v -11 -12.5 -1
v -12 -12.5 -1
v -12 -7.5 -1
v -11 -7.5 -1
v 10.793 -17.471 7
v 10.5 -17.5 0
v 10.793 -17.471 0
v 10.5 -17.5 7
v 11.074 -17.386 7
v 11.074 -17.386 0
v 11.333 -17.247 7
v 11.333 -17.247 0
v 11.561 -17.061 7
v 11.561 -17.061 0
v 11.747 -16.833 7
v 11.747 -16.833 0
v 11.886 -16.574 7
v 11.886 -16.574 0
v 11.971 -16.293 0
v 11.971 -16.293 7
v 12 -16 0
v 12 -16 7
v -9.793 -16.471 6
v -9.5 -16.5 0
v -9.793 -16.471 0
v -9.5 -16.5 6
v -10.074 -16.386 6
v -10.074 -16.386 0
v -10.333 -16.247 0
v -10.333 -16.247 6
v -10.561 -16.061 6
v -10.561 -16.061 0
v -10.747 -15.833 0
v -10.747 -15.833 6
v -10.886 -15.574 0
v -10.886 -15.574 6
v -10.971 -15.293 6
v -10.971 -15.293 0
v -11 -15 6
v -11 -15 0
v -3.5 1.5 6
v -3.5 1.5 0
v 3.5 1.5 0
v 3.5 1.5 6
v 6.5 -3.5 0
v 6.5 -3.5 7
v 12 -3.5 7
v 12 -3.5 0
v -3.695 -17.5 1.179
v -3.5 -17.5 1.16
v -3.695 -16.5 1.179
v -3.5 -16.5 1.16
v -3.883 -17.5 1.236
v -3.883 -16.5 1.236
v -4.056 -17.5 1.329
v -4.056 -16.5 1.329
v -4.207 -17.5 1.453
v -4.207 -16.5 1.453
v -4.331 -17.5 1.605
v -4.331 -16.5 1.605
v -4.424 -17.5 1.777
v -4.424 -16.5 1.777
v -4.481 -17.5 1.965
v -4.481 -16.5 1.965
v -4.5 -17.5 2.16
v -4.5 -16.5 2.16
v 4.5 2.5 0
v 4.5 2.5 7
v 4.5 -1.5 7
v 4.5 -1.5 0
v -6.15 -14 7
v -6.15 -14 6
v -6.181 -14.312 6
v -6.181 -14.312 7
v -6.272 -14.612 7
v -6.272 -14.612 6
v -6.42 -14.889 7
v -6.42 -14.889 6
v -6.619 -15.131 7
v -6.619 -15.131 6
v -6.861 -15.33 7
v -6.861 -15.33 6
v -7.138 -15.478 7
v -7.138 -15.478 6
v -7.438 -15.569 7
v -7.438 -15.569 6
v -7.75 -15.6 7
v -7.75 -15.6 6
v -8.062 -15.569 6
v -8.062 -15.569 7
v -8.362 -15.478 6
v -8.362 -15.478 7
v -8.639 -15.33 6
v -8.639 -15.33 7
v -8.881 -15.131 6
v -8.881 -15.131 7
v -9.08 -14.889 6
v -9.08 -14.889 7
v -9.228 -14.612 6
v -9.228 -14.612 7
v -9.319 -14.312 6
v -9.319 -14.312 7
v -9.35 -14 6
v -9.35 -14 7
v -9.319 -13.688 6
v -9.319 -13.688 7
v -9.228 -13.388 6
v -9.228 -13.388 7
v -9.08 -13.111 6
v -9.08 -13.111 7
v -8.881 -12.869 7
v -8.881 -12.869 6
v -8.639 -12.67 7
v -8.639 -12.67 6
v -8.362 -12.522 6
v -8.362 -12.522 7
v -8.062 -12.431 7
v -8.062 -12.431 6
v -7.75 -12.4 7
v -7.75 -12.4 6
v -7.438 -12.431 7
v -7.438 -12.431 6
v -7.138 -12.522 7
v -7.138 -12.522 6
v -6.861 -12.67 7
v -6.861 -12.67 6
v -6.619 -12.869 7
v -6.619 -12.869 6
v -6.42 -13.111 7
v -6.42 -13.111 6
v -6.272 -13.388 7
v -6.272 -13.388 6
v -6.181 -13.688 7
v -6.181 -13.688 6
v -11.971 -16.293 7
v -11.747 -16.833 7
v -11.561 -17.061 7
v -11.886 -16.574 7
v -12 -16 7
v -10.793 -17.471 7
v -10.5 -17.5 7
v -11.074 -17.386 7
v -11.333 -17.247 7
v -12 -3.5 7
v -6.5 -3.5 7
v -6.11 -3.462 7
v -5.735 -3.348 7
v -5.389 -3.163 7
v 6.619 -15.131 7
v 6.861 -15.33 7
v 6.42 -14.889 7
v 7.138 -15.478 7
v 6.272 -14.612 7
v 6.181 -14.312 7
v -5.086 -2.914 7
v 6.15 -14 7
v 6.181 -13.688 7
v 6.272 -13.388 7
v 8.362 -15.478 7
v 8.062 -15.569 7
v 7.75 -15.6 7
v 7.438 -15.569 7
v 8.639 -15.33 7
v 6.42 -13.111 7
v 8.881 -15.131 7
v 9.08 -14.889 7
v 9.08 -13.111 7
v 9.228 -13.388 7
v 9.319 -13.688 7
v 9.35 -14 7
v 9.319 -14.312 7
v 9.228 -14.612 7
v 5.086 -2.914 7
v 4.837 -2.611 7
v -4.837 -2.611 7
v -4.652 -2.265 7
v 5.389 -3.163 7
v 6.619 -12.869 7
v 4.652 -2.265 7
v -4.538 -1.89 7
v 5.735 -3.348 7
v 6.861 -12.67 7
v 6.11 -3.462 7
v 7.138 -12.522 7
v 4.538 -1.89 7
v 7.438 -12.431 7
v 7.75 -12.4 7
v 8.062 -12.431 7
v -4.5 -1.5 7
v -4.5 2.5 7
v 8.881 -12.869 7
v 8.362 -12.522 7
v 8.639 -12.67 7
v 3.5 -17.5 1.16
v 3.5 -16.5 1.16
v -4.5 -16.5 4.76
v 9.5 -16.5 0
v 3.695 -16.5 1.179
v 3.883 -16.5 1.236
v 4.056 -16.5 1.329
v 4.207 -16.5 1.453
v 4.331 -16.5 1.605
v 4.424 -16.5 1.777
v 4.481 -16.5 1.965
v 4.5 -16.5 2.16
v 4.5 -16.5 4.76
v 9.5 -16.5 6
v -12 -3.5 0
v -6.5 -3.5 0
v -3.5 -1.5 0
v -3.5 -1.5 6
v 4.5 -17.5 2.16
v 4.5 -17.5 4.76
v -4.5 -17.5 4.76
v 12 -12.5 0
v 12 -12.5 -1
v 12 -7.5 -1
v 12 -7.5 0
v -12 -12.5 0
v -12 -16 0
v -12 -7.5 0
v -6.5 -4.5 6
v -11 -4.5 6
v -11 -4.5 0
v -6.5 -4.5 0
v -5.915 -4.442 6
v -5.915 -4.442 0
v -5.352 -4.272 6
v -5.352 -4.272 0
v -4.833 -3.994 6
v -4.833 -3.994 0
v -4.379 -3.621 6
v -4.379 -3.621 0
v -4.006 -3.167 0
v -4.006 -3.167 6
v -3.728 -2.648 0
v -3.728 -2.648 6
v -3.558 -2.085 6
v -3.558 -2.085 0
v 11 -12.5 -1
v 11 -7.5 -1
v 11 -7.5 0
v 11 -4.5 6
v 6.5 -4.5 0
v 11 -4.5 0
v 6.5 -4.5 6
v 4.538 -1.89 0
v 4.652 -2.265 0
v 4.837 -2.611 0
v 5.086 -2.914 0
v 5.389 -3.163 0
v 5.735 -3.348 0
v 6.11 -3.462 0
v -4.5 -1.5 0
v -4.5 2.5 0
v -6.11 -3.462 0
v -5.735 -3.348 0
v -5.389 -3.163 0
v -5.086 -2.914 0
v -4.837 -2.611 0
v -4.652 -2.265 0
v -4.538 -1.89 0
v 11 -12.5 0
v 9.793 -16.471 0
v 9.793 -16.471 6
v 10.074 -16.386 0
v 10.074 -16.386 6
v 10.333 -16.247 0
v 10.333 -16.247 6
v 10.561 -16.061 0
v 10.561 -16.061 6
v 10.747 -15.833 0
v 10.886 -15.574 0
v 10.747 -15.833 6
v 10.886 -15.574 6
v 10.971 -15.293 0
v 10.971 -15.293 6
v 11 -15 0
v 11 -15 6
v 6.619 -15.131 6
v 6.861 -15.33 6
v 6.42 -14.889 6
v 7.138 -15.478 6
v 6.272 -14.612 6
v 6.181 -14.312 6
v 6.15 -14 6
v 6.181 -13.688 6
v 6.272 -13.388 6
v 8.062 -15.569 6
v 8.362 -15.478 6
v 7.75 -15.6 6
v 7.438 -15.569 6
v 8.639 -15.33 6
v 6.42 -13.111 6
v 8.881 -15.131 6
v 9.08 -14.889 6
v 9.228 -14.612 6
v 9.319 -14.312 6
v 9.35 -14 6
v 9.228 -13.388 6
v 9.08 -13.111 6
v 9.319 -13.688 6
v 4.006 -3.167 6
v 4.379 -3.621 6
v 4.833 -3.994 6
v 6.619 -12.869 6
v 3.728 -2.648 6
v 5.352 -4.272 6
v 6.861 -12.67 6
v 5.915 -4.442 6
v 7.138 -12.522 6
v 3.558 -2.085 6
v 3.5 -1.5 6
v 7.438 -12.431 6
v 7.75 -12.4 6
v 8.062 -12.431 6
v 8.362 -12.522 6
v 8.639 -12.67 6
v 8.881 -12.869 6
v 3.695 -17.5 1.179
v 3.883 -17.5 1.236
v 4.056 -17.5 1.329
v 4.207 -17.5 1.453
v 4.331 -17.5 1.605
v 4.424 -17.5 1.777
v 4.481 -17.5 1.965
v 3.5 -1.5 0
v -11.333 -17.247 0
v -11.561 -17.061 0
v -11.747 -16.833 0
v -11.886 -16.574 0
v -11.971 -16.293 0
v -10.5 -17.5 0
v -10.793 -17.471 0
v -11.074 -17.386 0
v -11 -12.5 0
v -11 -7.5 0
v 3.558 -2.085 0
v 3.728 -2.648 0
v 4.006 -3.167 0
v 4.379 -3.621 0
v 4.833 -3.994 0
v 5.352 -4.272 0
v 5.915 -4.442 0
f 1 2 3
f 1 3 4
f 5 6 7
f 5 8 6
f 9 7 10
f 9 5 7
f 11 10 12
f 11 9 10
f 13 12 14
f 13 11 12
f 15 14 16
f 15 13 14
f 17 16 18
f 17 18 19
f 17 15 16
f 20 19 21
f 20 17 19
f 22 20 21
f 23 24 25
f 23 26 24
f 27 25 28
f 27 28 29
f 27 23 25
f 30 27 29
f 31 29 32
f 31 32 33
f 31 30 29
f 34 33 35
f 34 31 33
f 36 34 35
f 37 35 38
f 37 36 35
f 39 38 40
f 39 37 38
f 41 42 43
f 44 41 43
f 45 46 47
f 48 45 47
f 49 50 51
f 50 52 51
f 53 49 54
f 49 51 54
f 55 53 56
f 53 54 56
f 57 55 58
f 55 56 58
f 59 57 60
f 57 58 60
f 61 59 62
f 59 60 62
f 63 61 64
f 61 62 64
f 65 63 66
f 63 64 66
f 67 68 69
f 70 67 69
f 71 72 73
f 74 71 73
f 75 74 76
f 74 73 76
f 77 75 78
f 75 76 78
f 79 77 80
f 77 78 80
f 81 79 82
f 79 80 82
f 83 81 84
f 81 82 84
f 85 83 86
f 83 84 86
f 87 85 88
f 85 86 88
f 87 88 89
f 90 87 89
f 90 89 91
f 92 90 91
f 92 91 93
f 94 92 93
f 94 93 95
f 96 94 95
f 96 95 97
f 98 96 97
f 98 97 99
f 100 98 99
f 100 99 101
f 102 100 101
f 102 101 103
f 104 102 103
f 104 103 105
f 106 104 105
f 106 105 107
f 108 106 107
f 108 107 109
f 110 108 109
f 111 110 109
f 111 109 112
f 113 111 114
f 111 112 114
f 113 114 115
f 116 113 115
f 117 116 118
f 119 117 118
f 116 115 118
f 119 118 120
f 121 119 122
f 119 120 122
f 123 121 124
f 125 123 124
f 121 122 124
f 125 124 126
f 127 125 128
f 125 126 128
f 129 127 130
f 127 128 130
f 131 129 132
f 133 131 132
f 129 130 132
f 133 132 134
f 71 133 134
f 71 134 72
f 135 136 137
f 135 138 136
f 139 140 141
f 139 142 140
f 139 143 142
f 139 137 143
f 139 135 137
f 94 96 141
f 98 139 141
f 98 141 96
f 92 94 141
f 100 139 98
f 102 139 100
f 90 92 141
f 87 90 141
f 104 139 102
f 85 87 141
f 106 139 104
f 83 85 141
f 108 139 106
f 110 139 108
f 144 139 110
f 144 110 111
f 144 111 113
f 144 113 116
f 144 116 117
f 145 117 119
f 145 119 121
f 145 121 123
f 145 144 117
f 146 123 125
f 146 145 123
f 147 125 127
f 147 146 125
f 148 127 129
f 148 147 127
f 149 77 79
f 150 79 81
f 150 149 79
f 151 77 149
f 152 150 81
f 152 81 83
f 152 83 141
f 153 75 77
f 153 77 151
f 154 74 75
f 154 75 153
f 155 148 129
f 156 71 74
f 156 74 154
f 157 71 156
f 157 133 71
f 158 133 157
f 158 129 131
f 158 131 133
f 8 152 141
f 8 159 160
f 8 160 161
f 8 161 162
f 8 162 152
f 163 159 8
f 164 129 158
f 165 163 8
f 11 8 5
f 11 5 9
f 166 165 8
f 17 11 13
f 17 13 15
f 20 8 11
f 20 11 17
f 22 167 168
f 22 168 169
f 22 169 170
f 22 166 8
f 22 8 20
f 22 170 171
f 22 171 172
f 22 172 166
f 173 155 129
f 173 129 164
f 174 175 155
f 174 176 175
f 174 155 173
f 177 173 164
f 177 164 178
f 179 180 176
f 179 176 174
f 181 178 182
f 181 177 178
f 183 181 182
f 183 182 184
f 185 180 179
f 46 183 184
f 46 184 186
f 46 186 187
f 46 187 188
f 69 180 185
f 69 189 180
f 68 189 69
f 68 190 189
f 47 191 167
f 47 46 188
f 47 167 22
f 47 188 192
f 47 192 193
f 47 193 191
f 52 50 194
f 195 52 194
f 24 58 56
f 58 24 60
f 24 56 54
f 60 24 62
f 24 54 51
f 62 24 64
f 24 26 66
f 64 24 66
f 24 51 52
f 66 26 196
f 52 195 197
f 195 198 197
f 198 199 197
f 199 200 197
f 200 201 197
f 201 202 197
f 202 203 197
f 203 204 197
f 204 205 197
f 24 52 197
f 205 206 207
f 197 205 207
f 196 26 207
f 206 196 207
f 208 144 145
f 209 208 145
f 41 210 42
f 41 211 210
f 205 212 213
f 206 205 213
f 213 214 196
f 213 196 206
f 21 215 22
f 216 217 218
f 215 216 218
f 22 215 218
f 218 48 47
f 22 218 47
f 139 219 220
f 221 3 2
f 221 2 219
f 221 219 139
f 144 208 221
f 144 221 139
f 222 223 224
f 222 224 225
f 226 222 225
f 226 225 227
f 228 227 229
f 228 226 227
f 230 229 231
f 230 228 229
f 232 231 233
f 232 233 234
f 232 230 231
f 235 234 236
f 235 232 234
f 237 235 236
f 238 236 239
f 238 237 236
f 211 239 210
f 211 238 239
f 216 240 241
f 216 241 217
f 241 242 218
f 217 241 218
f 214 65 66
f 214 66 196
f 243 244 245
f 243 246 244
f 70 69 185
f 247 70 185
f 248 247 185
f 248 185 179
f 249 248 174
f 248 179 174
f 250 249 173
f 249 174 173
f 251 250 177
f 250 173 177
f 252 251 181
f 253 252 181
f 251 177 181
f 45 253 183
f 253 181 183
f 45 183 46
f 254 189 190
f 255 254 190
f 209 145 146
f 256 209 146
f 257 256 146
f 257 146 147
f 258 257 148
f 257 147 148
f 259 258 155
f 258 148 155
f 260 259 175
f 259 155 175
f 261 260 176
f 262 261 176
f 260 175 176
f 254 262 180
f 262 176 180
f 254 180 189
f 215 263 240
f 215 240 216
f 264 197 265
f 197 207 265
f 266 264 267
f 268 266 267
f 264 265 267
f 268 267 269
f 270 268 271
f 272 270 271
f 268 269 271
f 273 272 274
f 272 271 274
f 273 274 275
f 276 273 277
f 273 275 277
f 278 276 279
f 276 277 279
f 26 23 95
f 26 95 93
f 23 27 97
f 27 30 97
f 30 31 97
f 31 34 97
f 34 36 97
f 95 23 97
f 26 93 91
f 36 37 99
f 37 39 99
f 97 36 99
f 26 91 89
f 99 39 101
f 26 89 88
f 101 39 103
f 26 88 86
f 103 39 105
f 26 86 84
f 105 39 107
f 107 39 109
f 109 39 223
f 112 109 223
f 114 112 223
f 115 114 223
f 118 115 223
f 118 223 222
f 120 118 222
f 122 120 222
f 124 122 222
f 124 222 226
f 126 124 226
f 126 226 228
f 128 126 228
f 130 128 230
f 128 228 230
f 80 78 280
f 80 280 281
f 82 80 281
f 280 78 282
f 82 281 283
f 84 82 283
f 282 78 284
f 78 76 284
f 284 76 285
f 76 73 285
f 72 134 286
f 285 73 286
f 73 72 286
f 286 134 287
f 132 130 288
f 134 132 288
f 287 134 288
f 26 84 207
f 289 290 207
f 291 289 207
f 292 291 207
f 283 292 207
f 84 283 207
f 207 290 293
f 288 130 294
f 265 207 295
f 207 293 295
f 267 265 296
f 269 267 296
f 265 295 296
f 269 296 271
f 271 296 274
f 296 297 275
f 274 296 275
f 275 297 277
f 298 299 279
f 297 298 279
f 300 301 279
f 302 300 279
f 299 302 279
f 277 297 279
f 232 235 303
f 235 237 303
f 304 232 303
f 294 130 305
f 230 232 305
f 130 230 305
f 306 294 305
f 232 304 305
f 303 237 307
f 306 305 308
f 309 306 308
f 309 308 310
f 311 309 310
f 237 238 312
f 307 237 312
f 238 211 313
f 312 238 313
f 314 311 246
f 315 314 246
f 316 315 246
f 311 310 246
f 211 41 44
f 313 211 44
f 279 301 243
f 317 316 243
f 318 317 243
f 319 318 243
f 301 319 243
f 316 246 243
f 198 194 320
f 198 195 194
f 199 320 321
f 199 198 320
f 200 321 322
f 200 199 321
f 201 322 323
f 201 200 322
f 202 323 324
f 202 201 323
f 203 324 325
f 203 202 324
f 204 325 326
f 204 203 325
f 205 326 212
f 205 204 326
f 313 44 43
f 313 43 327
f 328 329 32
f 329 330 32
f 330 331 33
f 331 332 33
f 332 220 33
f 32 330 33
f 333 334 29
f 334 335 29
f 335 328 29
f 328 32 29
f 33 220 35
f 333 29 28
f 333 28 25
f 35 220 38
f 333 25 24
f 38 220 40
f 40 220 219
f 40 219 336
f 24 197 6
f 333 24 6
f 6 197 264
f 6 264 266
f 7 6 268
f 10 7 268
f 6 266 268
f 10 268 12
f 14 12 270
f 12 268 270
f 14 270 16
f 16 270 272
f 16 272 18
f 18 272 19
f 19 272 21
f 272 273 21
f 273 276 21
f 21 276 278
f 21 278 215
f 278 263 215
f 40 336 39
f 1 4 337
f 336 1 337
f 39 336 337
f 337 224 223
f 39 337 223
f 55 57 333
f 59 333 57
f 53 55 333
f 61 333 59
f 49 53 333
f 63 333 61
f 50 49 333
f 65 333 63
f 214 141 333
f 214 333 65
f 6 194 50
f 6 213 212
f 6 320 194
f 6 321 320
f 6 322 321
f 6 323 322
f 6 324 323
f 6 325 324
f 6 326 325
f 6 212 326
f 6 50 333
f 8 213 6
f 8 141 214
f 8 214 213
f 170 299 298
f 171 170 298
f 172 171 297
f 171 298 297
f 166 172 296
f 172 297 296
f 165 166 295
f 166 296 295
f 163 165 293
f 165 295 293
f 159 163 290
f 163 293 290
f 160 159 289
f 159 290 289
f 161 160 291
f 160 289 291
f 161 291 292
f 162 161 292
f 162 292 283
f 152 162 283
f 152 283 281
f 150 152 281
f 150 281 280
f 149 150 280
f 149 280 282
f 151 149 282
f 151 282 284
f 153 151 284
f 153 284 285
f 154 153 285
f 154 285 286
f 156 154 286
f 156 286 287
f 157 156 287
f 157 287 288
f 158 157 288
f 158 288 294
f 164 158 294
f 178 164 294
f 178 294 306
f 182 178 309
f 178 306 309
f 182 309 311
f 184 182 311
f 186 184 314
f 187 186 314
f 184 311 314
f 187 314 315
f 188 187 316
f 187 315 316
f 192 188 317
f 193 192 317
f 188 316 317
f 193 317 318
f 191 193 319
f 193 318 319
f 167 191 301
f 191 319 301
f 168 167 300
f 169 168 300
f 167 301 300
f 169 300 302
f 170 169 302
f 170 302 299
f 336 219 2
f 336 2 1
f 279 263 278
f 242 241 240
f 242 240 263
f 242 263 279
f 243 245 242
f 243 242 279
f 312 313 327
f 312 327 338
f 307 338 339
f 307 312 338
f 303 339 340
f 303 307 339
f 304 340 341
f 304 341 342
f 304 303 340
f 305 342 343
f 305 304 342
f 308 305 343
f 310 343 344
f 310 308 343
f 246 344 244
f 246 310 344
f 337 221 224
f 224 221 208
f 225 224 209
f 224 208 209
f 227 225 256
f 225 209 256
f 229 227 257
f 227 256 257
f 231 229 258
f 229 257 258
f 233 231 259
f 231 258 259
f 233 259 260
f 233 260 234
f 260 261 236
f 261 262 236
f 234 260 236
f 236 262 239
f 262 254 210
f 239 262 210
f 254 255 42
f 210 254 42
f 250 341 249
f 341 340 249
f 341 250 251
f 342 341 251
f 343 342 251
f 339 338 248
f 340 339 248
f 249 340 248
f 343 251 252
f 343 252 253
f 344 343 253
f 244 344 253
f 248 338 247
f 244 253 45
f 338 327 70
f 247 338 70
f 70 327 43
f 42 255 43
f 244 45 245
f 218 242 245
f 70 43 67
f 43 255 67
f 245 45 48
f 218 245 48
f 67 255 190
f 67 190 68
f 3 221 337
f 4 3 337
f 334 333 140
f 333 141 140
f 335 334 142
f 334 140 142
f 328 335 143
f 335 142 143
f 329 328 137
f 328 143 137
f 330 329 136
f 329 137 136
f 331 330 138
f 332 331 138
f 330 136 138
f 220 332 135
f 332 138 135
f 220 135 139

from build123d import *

# Parameters (mm, degrees)
F0_W      = 24
F0_H      = 5
F0_R      = 1.7
F1_DEPTH  = 7
F2_W      = 24
F2_H      = 7
F3_DEPTH  = 15
F4_R      = 1.6
F5_DEPTH  = 25
F7_DEPTH  = 7
F8_T      = -1
F9_W      = 22
F9_H      = 5.6300974414
F10_DEPTH = 6
F11_W     = 9
F11_H     = 3.6
F12_DEPTH = 1
F13_R     = 1
F14_R     = 1.5
F15_W     = 1
F15_H     = 5
F16_DEPTH = 1


with BuildPart() as f1:
    # F0 (on Top) → F1 (new body)
    with BuildSketch(Plane.XY):
        Rectangle(F0_W, F0_H)
        with Locations((-7, 0)):
            Circle(F0_R, mode=Mode.SUBTRACT)
        with Locations((7, 0)):
            Circle(F0_R, mode=Mode.SUBTRACT)
    extrude(amount=F1_DEPTH)

    # F2 (on face) → F3 (join)
    with BuildSketch(Plane.XZ.offset(2.5)):
        with Locations((0, 3.5)):
            Rectangle(F2_W, F2_H)
    extrude(amount=F3_DEPTH)

    # F4 (on face) → F5 (cut)
    with BuildSketch(Plane(origin=(0, 0, 0), x_dir=(1, 0, 0), z_dir=(0, 0, -1))):
        with Locations((-7.75, 14)):
            Circle(F4_R)
        with Locations((7.75, 14)):
            Circle(F4_R)
    extrude(amount=-F5_DEPTH, mode=Mode.SUBTRACT)

    # F6 (on face) → F7 (cut, through all)
    with BuildSketch(Plane.XY.offset(7)):
        with BuildLine():
            Line((-4.5, 2.5), (-12, 2.5))
            Line((-12, 2.5), (-12, -3.5))
            Line((-12, -3.5), (-6.5, -3.5))
            ThreePointArc((-6.5, -3.5), (-5.0857864376, -2.9142135624), (-4.5, -1.5))
            Line((-4.5, -1.5), (-4.5, 2.5))
        make_face()
        with BuildLine():
            Line((12, -3.5), (12, 2.5))
            Line((12, 2.5), (4.5, 2.5))
            Line((4.5, 2.5), (4.5, -1.5))
            ThreePointArc((4.5, -1.5), (5.0857864376, -2.9142135624), (6.5, -3.5))
            Line((6.5, -3.5), (12, -3.5))
        make_face()
    extrude(amount=-F7_DEPTH, mode=Mode.SUBTRACT)

    # F8
    f8_openings = [f1.faces().sort_by_distance(p)[0] for p in [
        (0, -8.878513, 0),
    ]]
    offset(amount=F8_T, openings=f8_openings)

    # F9 (on face) → F10 (cut, through all)
    with BuildSketch(Plane(origin=(0, 0, 0), x_dir=(1, 0, 0), z_dir=(0, 0, -1))):
        with Locations((0, 13.6849512793)):
            Rectangle(F9_W, F9_H)
    extrude(amount=-F10_DEPTH, mode=Mode.SUBTRACT)

    # F11 (on face) → F12 (cut, through all)
    with BuildSketch(Plane.XZ.offset(17.5)):
        with Locations((0, 2.9600709677)):
            Rectangle(F11_W, F11_H)
    extrude(amount=-F12_DEPTH, mode=Mode.SUBTRACT)

    # F13
    f13_edges = [f1.edges().sort_by_distance(p)[0] for p in [
        (-4.5, -17, 1.160071),
        (4.5, -17, 1.160071),
    ]]
    fillet(f13_edges, radius=F13_R)

    # F14
    f14_edges = [f1.edges().sort_by_distance(p)[0] for p in [
        (12, -17.5, 3.5),
        (11, -16.5, 3),
        (-11, -16.5, 3),
        (-12, -17.5, 3.5),
    ]]
    fillet(f14_edges, radius=F14_R)

    # F15 (on face) → F16 (join)
    with BuildSketch(Plane(origin=(0, 0, 0), x_dir=(1, 0, 0), z_dir=(0, 0, -1))):
        with Locations((11.5, 10)):
            Rectangle(F15_W, F15_H)
        with Locations((-11.5, 10)):
            Rectangle(F15_W, F15_H)
    extrude(amount=F16_DEPTH)


solid = f1.part
